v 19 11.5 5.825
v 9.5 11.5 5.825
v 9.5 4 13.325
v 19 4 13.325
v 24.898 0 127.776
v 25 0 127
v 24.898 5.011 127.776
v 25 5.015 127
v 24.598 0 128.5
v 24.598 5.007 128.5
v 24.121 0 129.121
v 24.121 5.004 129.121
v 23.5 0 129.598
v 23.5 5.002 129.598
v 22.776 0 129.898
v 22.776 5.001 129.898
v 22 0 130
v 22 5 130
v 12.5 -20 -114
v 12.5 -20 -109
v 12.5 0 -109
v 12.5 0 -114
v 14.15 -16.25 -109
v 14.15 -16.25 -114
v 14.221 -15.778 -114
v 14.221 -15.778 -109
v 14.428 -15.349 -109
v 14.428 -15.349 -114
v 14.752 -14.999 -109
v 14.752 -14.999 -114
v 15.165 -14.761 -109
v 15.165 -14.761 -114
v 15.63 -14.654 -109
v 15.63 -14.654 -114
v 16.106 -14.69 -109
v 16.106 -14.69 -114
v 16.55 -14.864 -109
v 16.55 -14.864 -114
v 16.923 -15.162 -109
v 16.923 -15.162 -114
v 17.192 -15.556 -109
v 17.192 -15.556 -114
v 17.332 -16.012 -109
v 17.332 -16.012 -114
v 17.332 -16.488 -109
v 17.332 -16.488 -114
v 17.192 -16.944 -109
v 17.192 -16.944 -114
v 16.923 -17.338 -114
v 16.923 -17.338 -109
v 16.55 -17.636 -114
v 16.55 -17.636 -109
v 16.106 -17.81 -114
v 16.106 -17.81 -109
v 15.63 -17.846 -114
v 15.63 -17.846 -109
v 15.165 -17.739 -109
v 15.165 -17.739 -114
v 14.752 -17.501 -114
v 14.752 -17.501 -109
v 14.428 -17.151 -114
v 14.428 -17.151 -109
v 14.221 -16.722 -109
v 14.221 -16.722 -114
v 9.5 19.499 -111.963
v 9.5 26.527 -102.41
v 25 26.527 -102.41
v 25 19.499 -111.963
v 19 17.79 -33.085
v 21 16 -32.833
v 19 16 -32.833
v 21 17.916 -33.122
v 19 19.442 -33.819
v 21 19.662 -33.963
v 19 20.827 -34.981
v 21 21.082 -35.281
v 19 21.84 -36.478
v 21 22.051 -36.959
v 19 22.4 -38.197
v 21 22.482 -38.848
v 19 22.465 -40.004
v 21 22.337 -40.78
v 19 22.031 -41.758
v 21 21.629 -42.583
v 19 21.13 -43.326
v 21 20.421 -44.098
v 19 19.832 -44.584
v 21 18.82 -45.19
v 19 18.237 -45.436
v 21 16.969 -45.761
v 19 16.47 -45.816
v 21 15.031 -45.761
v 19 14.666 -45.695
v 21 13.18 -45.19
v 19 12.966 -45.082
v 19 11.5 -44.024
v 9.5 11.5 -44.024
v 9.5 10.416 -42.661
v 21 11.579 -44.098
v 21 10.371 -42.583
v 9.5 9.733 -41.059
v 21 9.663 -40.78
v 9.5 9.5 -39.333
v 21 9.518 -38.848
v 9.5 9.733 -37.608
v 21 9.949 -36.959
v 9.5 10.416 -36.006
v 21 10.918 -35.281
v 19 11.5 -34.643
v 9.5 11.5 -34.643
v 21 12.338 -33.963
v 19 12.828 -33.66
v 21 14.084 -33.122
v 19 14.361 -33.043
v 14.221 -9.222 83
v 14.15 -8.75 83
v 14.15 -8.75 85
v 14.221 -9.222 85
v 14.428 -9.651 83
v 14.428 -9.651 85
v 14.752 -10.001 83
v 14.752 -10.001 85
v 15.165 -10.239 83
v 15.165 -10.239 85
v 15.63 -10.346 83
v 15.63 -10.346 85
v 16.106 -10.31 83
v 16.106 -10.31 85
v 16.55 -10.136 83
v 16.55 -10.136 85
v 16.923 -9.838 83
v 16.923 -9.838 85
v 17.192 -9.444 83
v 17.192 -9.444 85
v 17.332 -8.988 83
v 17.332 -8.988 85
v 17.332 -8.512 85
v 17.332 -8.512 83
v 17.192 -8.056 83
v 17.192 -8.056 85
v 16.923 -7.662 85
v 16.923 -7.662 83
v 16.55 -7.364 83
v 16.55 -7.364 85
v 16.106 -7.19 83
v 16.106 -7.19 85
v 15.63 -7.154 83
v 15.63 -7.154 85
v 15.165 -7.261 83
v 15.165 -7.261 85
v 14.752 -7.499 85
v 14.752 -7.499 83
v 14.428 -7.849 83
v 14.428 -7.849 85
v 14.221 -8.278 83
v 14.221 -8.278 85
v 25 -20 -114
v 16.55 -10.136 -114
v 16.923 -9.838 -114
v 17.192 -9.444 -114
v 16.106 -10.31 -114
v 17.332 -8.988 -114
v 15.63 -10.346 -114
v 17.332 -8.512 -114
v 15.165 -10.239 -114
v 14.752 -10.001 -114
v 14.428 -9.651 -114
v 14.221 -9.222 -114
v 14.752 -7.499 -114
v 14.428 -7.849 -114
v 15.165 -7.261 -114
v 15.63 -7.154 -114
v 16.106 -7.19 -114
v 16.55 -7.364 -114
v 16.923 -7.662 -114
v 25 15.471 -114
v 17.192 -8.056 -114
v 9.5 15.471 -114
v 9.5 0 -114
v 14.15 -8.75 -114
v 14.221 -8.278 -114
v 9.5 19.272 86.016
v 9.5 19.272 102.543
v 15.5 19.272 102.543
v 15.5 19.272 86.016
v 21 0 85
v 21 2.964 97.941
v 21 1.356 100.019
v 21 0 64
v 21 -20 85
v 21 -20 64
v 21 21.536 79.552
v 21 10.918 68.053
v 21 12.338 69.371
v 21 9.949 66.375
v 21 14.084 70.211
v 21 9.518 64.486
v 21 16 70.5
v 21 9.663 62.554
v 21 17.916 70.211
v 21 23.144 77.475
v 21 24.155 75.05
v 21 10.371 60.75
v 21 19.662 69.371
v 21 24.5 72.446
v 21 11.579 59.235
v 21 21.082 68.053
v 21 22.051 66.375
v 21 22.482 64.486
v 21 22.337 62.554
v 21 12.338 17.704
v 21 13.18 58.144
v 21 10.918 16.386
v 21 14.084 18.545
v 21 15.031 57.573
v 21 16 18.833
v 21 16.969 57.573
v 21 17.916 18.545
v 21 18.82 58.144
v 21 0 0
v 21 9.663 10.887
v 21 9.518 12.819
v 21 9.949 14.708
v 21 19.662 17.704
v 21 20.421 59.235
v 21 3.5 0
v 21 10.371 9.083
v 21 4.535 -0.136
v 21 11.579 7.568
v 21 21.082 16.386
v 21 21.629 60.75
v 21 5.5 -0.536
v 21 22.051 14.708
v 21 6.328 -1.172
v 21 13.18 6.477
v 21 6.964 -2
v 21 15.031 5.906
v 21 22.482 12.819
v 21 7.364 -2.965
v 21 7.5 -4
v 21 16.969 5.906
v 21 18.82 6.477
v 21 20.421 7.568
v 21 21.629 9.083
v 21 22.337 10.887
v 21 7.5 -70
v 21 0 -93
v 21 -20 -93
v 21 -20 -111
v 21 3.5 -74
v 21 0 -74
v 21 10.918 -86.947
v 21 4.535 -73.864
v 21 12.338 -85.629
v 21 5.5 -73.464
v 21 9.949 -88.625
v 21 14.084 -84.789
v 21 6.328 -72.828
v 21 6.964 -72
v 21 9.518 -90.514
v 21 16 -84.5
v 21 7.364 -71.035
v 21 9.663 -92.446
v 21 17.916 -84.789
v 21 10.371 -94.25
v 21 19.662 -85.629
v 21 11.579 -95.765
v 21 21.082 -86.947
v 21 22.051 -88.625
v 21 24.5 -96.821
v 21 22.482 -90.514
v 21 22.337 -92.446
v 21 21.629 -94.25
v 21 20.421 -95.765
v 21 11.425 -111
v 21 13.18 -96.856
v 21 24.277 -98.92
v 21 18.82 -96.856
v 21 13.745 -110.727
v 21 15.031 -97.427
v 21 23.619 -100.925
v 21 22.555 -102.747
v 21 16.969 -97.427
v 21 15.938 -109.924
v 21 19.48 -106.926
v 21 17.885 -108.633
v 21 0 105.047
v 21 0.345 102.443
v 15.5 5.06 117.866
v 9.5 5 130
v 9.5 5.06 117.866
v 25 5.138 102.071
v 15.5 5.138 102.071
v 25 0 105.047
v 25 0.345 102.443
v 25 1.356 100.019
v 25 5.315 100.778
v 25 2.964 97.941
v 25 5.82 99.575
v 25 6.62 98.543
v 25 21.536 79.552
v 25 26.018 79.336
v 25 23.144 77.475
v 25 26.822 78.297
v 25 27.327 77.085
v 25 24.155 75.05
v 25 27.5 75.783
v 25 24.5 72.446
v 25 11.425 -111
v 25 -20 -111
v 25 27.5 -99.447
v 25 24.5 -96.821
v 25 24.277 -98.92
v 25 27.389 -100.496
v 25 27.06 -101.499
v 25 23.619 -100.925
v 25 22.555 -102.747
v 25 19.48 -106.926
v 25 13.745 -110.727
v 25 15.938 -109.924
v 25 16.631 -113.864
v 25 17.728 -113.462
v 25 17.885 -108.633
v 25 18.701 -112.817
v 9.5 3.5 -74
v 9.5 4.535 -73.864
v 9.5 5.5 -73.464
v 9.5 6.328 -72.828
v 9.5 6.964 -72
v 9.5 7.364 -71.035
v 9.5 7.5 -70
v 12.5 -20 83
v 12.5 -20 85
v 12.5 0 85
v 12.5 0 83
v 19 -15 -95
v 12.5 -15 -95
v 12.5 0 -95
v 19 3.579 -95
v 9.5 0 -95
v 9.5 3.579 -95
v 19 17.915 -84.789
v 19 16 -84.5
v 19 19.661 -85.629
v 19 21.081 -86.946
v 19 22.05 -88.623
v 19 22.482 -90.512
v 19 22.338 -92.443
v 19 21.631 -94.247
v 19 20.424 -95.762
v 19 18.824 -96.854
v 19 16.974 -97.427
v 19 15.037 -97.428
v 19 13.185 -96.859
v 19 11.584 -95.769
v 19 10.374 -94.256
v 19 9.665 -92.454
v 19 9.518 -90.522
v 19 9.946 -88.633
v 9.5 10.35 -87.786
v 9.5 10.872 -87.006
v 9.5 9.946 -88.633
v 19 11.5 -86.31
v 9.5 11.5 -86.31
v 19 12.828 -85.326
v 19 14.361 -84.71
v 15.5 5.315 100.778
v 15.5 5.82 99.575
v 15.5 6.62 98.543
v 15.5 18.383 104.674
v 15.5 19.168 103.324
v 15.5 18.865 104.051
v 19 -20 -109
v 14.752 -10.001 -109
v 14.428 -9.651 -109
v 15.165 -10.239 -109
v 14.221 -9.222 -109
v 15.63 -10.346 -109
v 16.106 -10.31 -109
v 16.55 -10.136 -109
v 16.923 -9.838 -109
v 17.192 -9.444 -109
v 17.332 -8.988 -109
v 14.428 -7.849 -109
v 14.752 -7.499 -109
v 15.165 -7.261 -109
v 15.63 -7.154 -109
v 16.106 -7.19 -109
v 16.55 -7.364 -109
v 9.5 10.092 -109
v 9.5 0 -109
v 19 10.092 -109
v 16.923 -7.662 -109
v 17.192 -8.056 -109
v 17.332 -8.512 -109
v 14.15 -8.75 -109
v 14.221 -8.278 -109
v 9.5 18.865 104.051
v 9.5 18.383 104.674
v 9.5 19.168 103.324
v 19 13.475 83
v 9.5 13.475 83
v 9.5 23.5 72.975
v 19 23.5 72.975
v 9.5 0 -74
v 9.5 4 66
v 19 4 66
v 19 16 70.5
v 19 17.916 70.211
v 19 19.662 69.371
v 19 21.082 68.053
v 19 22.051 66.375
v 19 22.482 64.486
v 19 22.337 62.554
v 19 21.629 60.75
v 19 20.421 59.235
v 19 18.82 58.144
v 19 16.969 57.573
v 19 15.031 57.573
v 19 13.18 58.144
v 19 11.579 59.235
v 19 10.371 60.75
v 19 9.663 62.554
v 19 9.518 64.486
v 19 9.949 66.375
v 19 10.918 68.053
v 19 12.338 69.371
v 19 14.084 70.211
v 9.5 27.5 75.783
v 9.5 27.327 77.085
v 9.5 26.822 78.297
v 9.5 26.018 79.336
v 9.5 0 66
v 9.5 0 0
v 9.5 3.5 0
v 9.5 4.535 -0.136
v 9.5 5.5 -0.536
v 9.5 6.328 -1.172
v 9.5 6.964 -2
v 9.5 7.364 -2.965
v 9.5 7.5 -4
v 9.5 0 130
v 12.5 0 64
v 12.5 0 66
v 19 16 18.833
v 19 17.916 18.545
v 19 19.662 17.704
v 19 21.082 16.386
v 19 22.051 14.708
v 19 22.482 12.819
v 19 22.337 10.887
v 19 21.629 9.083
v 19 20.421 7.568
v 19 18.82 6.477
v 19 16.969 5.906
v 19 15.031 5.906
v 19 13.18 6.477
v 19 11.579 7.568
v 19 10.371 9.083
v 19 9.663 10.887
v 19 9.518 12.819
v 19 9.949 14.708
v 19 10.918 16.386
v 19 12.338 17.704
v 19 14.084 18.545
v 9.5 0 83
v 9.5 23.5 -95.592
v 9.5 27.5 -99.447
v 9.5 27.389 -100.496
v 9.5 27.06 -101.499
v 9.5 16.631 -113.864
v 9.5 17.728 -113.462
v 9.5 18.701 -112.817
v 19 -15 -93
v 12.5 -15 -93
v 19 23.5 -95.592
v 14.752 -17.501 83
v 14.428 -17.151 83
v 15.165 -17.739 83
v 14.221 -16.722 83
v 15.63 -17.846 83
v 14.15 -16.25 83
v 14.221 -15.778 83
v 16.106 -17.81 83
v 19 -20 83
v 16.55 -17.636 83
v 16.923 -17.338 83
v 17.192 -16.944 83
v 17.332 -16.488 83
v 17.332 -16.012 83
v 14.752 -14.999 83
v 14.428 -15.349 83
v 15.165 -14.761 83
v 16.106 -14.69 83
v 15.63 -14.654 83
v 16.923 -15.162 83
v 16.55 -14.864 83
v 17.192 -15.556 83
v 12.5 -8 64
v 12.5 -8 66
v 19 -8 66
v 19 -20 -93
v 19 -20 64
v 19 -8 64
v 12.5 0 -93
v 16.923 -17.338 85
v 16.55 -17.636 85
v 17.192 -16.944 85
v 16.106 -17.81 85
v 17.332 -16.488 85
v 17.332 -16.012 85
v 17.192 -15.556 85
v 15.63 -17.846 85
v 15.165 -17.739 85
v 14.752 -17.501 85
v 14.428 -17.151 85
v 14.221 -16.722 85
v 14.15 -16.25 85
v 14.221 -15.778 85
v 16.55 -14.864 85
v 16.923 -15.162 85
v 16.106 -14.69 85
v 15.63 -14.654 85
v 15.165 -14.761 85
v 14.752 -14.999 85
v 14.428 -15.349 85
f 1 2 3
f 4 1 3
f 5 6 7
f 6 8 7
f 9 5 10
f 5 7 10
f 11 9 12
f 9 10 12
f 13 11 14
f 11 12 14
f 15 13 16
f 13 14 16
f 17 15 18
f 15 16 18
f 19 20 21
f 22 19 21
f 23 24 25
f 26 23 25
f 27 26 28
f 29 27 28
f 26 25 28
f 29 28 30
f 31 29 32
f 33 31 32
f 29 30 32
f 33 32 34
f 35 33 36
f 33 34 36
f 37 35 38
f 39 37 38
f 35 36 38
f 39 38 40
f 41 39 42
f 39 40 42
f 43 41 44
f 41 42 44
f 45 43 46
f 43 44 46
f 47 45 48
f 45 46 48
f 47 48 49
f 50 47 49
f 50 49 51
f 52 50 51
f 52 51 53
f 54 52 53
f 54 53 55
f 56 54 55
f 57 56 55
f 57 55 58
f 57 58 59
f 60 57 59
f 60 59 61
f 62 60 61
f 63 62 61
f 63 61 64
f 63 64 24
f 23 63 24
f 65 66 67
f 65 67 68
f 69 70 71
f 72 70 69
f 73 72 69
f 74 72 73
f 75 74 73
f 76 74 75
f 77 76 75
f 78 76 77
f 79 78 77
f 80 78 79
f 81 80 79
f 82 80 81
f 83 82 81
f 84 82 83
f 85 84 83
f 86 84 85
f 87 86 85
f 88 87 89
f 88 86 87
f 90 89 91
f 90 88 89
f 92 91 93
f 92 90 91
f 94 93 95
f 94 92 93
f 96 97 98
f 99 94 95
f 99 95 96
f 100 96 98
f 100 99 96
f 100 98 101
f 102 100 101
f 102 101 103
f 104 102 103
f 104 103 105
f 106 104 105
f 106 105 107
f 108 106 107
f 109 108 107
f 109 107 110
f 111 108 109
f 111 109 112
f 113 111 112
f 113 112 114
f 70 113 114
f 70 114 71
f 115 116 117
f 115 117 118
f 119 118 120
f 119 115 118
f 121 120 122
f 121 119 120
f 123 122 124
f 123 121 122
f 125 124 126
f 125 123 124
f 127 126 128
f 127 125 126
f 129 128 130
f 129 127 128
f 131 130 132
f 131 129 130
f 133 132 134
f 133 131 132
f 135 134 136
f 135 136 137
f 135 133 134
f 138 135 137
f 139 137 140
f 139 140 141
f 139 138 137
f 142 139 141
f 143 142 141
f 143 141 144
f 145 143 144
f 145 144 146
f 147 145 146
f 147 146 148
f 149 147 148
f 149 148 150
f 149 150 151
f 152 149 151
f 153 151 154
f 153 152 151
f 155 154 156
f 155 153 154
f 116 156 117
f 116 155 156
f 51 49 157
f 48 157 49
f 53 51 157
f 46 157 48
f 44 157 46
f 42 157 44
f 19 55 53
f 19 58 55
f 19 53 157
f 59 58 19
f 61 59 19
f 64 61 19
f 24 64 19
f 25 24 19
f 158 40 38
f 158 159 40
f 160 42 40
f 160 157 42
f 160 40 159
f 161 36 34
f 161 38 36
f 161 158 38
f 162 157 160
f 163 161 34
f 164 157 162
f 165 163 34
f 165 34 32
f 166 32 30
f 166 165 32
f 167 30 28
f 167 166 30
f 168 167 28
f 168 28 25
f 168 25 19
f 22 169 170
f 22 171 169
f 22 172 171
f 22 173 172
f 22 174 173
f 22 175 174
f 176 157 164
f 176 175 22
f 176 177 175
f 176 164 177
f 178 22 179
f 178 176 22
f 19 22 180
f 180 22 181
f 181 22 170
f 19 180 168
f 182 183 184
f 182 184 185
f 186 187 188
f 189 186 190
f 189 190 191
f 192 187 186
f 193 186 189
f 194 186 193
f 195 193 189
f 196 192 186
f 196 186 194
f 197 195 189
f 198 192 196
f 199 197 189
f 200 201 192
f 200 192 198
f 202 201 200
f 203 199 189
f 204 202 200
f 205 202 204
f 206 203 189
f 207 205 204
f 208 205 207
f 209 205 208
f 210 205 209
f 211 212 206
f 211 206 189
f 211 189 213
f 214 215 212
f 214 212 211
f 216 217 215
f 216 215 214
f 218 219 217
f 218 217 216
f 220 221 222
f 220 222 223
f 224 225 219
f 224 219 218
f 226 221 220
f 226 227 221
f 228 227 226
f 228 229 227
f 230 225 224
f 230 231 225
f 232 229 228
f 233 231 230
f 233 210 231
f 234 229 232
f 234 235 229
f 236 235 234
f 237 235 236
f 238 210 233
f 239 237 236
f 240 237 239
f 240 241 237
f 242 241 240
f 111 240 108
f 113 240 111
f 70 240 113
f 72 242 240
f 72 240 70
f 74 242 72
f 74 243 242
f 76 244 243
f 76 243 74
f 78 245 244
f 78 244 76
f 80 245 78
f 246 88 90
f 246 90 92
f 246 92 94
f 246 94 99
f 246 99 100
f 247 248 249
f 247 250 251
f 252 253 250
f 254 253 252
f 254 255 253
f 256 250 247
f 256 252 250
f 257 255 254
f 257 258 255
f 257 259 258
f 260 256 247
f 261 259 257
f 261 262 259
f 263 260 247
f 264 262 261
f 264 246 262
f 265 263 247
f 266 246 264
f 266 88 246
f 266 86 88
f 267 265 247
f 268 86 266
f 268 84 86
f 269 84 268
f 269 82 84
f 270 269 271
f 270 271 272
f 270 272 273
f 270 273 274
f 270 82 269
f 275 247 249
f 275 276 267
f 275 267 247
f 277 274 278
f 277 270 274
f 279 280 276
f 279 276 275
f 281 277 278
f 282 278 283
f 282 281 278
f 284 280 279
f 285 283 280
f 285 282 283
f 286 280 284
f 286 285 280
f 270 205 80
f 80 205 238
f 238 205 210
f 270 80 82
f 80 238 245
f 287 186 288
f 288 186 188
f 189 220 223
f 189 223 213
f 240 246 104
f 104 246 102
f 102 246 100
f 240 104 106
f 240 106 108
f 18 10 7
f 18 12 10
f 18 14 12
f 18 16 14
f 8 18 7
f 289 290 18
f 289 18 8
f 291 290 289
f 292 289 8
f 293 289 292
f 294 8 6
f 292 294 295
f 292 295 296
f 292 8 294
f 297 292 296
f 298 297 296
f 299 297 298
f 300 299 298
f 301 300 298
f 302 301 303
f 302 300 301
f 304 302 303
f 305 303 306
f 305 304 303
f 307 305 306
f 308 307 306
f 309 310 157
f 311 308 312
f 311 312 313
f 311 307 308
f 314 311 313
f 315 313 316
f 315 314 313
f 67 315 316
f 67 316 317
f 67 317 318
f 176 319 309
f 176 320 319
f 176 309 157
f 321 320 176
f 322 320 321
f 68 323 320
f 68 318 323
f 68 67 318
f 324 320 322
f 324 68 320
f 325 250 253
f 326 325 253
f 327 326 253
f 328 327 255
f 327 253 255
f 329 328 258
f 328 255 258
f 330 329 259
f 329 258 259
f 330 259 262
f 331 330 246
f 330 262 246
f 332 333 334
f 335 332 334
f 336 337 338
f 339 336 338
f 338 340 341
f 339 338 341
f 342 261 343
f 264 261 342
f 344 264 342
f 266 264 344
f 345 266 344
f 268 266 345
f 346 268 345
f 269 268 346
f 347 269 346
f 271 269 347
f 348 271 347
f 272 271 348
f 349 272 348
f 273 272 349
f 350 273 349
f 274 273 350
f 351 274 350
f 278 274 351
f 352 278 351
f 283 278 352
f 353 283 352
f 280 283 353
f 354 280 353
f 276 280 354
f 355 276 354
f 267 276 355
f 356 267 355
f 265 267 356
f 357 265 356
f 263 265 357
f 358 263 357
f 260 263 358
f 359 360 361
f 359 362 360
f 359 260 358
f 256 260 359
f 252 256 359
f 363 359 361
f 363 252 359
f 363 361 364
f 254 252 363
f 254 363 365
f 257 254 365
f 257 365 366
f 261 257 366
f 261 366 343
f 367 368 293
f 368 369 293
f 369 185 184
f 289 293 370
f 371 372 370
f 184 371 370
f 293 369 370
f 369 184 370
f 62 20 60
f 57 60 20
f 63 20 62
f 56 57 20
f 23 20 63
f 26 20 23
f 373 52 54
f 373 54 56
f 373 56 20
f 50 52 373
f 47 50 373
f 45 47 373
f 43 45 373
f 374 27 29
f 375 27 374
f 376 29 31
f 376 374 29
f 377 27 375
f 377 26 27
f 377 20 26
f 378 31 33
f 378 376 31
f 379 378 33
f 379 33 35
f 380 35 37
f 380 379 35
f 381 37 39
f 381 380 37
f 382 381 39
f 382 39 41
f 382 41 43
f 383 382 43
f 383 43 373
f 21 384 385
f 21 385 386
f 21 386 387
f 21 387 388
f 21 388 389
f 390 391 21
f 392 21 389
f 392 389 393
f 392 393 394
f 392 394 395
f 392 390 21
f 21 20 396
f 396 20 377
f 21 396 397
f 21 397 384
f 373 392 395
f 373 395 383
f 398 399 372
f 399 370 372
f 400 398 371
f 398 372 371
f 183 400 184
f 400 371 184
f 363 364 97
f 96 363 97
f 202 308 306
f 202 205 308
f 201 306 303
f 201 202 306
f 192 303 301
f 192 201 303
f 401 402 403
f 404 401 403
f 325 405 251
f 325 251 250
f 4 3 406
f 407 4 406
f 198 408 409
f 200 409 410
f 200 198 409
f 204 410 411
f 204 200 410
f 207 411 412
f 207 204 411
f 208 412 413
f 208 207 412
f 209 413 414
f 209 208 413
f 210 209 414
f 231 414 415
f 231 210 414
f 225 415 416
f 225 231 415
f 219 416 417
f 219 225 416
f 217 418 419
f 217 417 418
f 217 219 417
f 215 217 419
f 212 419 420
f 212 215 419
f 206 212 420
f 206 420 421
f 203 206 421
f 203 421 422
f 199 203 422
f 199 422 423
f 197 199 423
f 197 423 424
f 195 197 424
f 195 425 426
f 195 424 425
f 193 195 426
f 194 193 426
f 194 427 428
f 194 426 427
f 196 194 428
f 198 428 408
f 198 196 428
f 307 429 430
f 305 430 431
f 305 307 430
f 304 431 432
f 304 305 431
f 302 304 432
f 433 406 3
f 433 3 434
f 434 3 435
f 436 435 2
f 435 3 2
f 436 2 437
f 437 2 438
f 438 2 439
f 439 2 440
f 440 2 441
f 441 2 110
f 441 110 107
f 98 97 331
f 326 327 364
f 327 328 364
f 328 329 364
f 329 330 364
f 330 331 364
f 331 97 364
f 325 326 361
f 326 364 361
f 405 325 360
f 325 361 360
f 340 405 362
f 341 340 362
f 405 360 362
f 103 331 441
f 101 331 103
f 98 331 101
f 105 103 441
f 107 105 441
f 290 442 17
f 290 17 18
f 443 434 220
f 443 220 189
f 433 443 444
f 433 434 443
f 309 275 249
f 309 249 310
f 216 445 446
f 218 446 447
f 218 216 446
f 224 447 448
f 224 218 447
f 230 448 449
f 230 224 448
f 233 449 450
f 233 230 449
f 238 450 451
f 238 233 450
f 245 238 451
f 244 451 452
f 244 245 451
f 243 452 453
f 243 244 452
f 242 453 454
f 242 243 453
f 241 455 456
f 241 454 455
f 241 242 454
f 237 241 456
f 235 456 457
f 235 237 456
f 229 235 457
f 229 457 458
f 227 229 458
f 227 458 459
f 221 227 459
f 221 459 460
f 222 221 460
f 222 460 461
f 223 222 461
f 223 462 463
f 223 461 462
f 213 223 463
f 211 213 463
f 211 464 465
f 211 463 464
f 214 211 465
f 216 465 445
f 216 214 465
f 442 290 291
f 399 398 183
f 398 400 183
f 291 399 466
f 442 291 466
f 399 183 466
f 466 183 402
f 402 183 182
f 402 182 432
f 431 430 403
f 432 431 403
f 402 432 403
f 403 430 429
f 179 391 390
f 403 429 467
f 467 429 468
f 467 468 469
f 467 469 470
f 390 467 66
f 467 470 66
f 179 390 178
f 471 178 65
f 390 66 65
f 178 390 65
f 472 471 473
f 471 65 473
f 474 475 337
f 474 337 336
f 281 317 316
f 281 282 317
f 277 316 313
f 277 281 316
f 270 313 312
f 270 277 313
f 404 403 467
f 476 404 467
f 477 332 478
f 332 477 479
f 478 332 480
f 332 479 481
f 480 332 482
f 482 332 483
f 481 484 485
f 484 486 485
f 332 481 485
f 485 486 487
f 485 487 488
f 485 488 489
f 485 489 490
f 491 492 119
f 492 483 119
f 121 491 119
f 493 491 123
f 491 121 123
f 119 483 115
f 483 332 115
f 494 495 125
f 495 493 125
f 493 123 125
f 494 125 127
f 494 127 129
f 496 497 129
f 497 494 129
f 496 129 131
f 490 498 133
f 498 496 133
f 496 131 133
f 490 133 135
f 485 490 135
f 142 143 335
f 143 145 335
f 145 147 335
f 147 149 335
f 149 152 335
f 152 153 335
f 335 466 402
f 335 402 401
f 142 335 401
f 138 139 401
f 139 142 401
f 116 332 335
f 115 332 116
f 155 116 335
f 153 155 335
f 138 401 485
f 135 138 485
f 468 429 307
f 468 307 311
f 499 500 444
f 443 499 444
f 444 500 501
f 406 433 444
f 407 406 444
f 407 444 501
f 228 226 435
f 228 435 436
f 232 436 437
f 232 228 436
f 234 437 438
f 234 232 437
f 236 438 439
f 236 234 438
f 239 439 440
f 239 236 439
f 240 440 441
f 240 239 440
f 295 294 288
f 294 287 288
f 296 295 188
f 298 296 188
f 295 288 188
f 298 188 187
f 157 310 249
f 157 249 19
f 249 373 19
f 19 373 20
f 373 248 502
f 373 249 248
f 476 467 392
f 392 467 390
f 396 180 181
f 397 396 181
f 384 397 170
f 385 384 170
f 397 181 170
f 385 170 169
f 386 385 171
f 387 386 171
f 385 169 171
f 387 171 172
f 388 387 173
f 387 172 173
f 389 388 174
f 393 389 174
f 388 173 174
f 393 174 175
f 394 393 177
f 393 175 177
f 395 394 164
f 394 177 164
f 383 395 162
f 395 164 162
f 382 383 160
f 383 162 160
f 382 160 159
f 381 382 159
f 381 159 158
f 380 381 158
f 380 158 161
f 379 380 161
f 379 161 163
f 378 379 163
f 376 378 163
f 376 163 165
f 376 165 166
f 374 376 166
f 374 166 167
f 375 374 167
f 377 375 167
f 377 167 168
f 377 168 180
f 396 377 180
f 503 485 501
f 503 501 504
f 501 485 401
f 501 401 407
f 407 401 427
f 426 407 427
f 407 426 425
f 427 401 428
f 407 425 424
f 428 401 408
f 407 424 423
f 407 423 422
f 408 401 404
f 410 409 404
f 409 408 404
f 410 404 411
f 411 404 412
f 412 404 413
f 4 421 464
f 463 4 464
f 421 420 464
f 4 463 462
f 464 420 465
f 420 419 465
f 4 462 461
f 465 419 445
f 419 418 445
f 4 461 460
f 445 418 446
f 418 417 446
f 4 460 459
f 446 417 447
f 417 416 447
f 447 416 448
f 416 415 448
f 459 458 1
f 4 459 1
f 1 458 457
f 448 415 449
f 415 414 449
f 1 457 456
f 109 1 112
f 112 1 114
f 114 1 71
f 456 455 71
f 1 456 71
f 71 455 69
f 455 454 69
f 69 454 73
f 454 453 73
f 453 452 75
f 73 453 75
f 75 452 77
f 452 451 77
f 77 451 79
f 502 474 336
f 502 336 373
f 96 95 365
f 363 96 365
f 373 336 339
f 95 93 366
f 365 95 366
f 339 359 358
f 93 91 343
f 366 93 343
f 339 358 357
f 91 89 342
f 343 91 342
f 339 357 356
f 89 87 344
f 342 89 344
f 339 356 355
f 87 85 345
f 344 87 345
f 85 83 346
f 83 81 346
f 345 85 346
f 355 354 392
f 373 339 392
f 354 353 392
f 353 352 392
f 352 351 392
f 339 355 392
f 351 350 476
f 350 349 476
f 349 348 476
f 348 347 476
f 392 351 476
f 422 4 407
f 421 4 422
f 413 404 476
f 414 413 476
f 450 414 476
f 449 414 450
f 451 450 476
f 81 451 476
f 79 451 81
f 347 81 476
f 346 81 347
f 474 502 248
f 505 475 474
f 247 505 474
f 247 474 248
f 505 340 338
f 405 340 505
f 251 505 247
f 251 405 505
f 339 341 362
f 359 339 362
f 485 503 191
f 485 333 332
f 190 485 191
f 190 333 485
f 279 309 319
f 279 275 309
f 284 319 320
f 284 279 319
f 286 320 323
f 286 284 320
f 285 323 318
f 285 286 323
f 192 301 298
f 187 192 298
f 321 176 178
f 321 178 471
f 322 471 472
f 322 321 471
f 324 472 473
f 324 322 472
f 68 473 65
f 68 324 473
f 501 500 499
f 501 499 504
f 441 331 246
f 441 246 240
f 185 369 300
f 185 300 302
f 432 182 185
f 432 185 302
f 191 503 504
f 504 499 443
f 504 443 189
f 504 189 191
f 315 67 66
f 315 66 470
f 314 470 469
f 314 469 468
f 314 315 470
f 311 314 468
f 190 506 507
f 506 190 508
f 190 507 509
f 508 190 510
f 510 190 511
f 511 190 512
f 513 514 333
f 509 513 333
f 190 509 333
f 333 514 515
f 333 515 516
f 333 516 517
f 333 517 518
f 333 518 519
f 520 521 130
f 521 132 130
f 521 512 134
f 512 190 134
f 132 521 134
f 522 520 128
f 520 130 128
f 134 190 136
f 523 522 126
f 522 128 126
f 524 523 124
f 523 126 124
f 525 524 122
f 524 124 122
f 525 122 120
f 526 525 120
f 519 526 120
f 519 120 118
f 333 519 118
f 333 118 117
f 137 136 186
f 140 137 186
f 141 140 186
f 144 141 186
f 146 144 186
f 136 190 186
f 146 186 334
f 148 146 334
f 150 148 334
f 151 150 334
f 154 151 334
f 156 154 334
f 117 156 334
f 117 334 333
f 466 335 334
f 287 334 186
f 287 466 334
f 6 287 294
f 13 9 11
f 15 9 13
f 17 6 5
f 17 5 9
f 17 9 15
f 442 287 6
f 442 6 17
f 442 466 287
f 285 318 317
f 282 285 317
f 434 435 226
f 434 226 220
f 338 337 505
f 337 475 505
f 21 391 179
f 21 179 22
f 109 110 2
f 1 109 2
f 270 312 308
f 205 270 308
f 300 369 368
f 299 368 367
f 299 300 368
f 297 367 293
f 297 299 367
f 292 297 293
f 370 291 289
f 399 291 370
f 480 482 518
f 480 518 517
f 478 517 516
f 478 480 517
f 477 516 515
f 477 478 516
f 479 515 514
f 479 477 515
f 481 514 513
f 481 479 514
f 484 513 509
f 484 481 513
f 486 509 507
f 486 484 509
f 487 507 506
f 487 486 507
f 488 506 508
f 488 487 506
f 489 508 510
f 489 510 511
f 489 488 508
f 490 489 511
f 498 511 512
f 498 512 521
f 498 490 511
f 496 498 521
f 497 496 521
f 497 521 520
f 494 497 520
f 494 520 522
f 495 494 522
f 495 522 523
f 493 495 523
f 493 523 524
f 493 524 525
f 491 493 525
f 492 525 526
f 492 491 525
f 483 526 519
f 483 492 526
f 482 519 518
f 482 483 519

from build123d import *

# Parameters (mm, degrees)
BOSS_EXTRUDE1_DEPTH      = 25
CUT_EXTRUDE1_DEPTH       = 4
FILLET1_R                = 4
FILLET2_R                = 10
FILLET3_R                = 5
FILLET4_R                = 3
BOSS_EXTRUDE2_DEPTH      = 3
BOSS_EXTRUDE2_DEPTH_BACK = 3
FILLET5_R                = 3
SKETCH6_W                = 13
SKETCH6_H                = 14
BOSS_EXTRUDE3_DEPTH      = 20
BOSS_EXTRUDE4_DEPTH      = 20
SKETCH9_W                = 13
SKETCH9_H                = 2
BOSS_EXTRUDE5_DEPTH      = 8
SKETCH7_W                = 13
SKETCH7_H                = 2
CUT_EXTRUDE2_DEPTH       = 5
SKETCH11_R               = 1.6
CUT_EXTRUDE3_DEPTH       = 19
CUT_EXTRUDE4_START       = -2
SKETCH12_R               = 1.6
CUT_EXTRUDE4_DEPTH       = 2
CUT_EXTRUDE5_DEPTH       = 6.5
CUT_EXTRUDE5_DEPTH_BACK  = 6.5
LARGE_START              = -17
SKETCH15_R               = 6.5
LARGE_SCREW_HOLES_DEPTH  = 17
SKETCH17_W               = 9.5
SKETCH17_H               = 262.988655448
CUT_EXTRUDE6_DEPTH       = 141.64583179
SKETCH18_W               = 3
SKETCH18_H               = 20
CUT_EXTRUDE7_DEPTH       = 203.440732067


with BuildPart() as part:
    # Sketch1 → Boss-Extrude1 (new body)
    with BuildSketch(Plane(origin=(0, 0, 0), x_dir=(0, 0, -1), z_dir=(1, 0, 0))):
        Polygon((0, 0), (-130, 0), (-130, 5), (-100.000366453, 5.148280317), (-77.868517379, 27.5), (101.088229162, 27.5), (114, 18), (114, 0), (74, 0), (74, 7.5), (0, 7.5), align=None)
    extrude(amount=BOSS_EXTRUDE1_DEPTH)

    # Sketch4 → Cut-Extrude1 (cut)
    with BuildSketch(Plane(origin=(25, 0, 0), x_dir=(0, 0, -1), z_dir=(1, 0, 0))):
        Polygon((-100.876178749, 0), (0, 0), (111, 0), (111, 3), (111, 16.482758557), (100.103496394, 24.5), (-76.617181678, 24.5), align=None)
    cut_extrude1 = extrude(amount=-CUT_EXTRUDE1_DEPTH, mode=Mode.SUBTRACT)

    # Mirror2: Cut-Extrude1 across plane
    add(cut_extrude1.mirror(Plane(origin=(12.5, 0, 0), x_dir=(0, 0, 1), z_dir=(1, 0, 0))), mode=Mode.SUBTRACT)

    # Fillet1
    fillet1_edges = [part.edges().sort_by_distance(p)[0] for p in [
        (12.5, 7.5, -74),
        (12.5, 7.5, 0),
    ]]
    fillet(fillet1_edges, radius=FILLET1_R)

    # Fillet2
    fillet2_edges = [part.edges().sort_by_distance(p)[0] for p in [
        (23, 0, 100.876178749),
        (23, 24.5, 76.617181678),
        (23, 24.5, -100.103496394),
        (23, 16.482758557, -111),
        (2, 0, 100.876178749),
        (2, 16.482758557, -111),
        (2, 24.5, -100.103496394),
        (2, 24.5, 76.617181678),
    ]]
    fillet(fillet2_edges, radius=FILLET2_R)

    # Fillet3
    fillet3_edges = [part.edges().sort_by_distance(p)[0] for p in [
        (12.5, 5.148280317, 100.000366453),
        (12.5, 27.5, 77.868517379),
        (12.5, 27.5, -101.088229162),
        (12.5, 18, -114),
    ]]
    fillet(fillet3_edges, radius=FILLET3_R)

    # Fillet4
    fillet4_edges = [part.edges().sort_by_distance(p)[0] for p in [
        (0, 2.5, 130),
        (25, 2.5, 130),
    ]]
    fillet(fillet4_edges, radius=FILLET4_R)

    # Sketch5 → Boss-Extrude2 (add, two sides: drawn at the far end of the back side and taken through both)
    with BuildSketch(Plane(origin=(12.5, 0, 0), x_dir=(0, 0, -1), z_dir=(1, 0, 0)).offset(-BOSS_EXTRUDE2_DEPTH_BACK)):
        Polygon((-117.8659777, 5.059975288), (-103.793914836, 19.271838176), (-72.605250228, 19.271838176), (-95.8659777, 5.059975288), align=None)
    extrude(amount=BOSS_EXTRUDE2_DEPTH + BOSS_EXTRUDE2_DEPTH_BACK)

    # Fillet5
    fillet5_edges = [part.edges().sort_by_distance(p)[0] for p in [
        (12.5, 19.271838176, 103.793914836),
    ]]
    fillet(fillet5_edges, radius=FILLET5_R)

    # Sketch6 → Boss-Extrude3 (add)
    with BuildSketch(Plane.XZ):
        Polygon((0, -111), (4, -111), (4, -93), (21, -93), (21, -111), (25, -111), (25, -114), (0, -114), align=None)
        with Locations((12.5, -102)):
            Rectangle(SKETCH6_W, SKETCH6_H, mode=Mode.SUBTRACT)
    extrude(amount=BOSS_EXTRUDE3_DEPTH)

    # Sketch8 → Boss-Extrude4 (add)
    with BuildSketch(Plane.XZ):
        Polygon((21, 85), (4, 85), (4, 64), (6, 64), (6, 83), (19, 83), (19, 64), (21, 64), align=None)
    extrude(amount=BOSS_EXTRUDE4_DEPTH)

    # Sketch9 → Boss-Extrude5 (add)
    with BuildSketch(Plane.XZ):
        with Locations((12.5, 65)):
            Rectangle(SKETCH9_W, SKETCH9_H)
    extrude(amount=BOSS_EXTRUDE5_DEPTH)

    # Sketch7 → Cut-Extrude2 (cut)
    with BuildSketch(Plane.XZ.offset(20)):
        with Locations((12.5, -94)):
            Rectangle(SKETCH7_W, SKETCH7_H)
    extrude(amount=-CUT_EXTRUDE2_DEPTH, mode=Mode.SUBTRACT)

    # Sketch11 → Cut-Extrude3 (cut)
    with BuildSketch(Plane(origin=(0, 0, -114), x_dir=(-1, 0, 0), z_dir=(0, 0, -1))):
        with Locations((-15.75, -16.25)):
            Circle(SKETCH11_R)
        with Locations((-15.75, -8.75)):
            Circle(SKETCH11_R)
        with Locations((-9.25, -8.75)):
            Circle(SKETCH11_R)
        with Locations((-9.25, -16.25)):
            Circle(SKETCH11_R)
    extrude(amount=-CUT_EXTRUDE3_DEPTH, mode=Mode.SUBTRACT)

    # Sketch12 → Cut-Extrude4 (cut)
    with BuildSketch(Plane.XY.offset(85).offset(CUT_EXTRUDE4_START)):
        with Locations(Location((15.75, -16.25, 0), (0, 0, 180))):
            Circle(SKETCH12_R)
        with Locations(Location((9.25, -16.25, 0), (0, 0, 180))):
            Circle(SKETCH12_R)
        with Locations(Location((9.25, -8.75, 0), (0, 0, 180))):
            Circle(SKETCH12_R)
        with Locations(Location((15.75, -8.75, 0), (0, 0, 180))):
            Circle(SKETCH12_R)
    extrude(amount=CUT_EXTRUDE4_DEPTH, mode=Mode.SUBTRACT)

    # Sketch14 → Cut-Extrude5 (cut, two sides: drawn at the far end of the back side and taken through both)
    with BuildSketch(Plane(origin=(12.5, 0, 0), x_dir=(0, 0, -1), z_dir=(1, 0, 0)).offset(-CUT_EXTRUDE5_DEPTH_BACK)):
        Polygon((-83, 0), (-83, 13.475167258), (-72.975167258, 23.5), (95.592427597, 23.5), (109, 10.092427597), (109, 0), (95, 0), (95, 3.57939317), (87.07939317, 11.5), (-5.825100808, 11.5), (-13.325100808, 4), (-66, 4), (-66, 0), align=None)
    extrude(amount=CUT_EXTRUDE5_DEPTH + CUT_EXTRUDE5_DEPTH_BACK, mode=Mode.SUBTRACT)

    # Sketch15 → large screw holes (cut)
    with BuildSketch(Plane.ZY.offset(-4).offset(LARGE_START)):
        with Locations((-91, 16)):
            Circle(SKETCH15_R)
        with Locations((-39.333333333, 16)):
            Circle(SKETCH15_R)
        with Locations((64, 16)):
            Circle(SKETCH15_R)
        with Locations((12.333333333, 16)):
            Circle(SKETCH15_R)
    extrude(amount=LARGE_SCREW_HOLES_DEPTH, mode=Mode.SUBTRACT)

    # Sketch17 → Cut-Extrude6 (cut, through all)
    with BuildSketch(Plane(origin=(0, 27.5, 0), x_dir=(1, 0, 0), z_dir=(0, 1, 0))):
        with Locations((4.75, -2.000036068)):
            Rectangle(SKETCH17_W, SKETCH17_H)
    extrude(amount=-CUT_EXTRUDE6_DEPTH, mode=Mode.SUBTRACT)

    # Sketch18 → Cut-Extrude7 (cut, through all)
    with BuildSketch(Plane.XY.offset(85)):
        with Locations((11, -10)):
            Rectangle(SKETCH18_W, SKETCH18_H)
    extrude(amount=-CUT_EXTRUDE7_DEPTH, mode=Mode.SUBTRACT)


solid = part.part
